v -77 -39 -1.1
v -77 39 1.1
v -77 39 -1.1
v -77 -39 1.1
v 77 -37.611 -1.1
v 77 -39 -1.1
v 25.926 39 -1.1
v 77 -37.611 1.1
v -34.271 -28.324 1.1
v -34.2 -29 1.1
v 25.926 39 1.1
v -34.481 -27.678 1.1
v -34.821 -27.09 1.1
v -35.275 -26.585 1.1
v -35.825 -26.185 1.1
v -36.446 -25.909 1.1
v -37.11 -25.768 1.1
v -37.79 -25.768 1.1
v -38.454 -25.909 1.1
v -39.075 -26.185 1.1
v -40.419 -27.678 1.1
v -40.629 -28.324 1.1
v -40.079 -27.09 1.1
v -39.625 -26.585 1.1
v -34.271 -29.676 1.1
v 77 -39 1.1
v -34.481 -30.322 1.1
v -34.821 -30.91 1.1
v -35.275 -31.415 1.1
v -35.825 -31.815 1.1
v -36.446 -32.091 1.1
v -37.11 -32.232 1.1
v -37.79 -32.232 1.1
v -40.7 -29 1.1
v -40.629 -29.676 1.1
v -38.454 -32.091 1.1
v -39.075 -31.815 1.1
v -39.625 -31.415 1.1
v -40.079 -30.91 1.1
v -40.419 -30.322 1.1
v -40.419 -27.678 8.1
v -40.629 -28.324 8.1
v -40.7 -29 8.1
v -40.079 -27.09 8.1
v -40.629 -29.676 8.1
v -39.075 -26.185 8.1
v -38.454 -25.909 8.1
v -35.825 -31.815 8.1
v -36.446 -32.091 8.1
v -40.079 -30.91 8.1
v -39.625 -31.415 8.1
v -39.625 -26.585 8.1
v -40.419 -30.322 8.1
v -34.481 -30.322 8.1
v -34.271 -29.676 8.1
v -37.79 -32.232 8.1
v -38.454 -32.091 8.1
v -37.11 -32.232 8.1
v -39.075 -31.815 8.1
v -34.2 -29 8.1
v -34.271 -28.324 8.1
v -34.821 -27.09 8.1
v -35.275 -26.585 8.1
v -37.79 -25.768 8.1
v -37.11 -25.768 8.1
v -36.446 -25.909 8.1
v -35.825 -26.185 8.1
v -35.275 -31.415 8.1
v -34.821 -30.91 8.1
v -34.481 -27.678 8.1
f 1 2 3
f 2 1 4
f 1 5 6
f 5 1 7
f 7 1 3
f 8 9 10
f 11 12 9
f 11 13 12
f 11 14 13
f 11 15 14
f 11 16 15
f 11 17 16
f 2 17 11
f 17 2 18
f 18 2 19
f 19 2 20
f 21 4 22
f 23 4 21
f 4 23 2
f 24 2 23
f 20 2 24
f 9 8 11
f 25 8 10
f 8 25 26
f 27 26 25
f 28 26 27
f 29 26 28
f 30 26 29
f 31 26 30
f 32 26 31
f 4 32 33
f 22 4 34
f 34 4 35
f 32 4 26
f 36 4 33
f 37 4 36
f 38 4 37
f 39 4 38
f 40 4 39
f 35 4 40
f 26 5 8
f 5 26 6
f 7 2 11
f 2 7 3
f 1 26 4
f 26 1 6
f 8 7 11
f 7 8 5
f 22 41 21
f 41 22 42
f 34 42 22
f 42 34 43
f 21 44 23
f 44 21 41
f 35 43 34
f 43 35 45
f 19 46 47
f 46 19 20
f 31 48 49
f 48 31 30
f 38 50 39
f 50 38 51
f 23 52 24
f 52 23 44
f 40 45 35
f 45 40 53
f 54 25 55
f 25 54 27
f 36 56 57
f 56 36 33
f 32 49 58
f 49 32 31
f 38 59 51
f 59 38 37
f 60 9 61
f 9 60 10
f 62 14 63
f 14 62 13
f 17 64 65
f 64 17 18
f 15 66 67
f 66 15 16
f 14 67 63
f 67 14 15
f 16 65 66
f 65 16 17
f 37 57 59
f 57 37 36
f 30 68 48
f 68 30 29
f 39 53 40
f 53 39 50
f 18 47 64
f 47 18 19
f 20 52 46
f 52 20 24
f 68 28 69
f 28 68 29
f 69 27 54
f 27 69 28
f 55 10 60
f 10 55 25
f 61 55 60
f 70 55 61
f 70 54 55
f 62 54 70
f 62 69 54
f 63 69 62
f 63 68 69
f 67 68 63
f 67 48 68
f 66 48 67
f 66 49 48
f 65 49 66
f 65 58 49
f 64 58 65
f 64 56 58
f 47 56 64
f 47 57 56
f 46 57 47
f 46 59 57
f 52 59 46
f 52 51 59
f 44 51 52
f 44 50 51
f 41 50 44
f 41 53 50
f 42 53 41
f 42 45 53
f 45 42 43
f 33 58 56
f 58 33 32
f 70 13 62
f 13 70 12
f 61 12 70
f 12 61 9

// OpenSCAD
thick=2.2;
xl=154;
yl=78;
sl=102;
ch=7;
rad=6.5/2;

rotate([0,180,0])
union()
{
	difference()
	{
		cube([xl, yl, thick], center=true);
		translate([-40-xl/2+17,0,0])
		rotate([0,0,-atan2(xl-sl, yl)])
		cube([80, 200, 2*thick], center=true);
	}
	translate([xl/2-36.3-rad,-yl/2+6.75+rad,-thick/2-ch])
	cylinder(r=rad, h=ch, $fn=30);
}
